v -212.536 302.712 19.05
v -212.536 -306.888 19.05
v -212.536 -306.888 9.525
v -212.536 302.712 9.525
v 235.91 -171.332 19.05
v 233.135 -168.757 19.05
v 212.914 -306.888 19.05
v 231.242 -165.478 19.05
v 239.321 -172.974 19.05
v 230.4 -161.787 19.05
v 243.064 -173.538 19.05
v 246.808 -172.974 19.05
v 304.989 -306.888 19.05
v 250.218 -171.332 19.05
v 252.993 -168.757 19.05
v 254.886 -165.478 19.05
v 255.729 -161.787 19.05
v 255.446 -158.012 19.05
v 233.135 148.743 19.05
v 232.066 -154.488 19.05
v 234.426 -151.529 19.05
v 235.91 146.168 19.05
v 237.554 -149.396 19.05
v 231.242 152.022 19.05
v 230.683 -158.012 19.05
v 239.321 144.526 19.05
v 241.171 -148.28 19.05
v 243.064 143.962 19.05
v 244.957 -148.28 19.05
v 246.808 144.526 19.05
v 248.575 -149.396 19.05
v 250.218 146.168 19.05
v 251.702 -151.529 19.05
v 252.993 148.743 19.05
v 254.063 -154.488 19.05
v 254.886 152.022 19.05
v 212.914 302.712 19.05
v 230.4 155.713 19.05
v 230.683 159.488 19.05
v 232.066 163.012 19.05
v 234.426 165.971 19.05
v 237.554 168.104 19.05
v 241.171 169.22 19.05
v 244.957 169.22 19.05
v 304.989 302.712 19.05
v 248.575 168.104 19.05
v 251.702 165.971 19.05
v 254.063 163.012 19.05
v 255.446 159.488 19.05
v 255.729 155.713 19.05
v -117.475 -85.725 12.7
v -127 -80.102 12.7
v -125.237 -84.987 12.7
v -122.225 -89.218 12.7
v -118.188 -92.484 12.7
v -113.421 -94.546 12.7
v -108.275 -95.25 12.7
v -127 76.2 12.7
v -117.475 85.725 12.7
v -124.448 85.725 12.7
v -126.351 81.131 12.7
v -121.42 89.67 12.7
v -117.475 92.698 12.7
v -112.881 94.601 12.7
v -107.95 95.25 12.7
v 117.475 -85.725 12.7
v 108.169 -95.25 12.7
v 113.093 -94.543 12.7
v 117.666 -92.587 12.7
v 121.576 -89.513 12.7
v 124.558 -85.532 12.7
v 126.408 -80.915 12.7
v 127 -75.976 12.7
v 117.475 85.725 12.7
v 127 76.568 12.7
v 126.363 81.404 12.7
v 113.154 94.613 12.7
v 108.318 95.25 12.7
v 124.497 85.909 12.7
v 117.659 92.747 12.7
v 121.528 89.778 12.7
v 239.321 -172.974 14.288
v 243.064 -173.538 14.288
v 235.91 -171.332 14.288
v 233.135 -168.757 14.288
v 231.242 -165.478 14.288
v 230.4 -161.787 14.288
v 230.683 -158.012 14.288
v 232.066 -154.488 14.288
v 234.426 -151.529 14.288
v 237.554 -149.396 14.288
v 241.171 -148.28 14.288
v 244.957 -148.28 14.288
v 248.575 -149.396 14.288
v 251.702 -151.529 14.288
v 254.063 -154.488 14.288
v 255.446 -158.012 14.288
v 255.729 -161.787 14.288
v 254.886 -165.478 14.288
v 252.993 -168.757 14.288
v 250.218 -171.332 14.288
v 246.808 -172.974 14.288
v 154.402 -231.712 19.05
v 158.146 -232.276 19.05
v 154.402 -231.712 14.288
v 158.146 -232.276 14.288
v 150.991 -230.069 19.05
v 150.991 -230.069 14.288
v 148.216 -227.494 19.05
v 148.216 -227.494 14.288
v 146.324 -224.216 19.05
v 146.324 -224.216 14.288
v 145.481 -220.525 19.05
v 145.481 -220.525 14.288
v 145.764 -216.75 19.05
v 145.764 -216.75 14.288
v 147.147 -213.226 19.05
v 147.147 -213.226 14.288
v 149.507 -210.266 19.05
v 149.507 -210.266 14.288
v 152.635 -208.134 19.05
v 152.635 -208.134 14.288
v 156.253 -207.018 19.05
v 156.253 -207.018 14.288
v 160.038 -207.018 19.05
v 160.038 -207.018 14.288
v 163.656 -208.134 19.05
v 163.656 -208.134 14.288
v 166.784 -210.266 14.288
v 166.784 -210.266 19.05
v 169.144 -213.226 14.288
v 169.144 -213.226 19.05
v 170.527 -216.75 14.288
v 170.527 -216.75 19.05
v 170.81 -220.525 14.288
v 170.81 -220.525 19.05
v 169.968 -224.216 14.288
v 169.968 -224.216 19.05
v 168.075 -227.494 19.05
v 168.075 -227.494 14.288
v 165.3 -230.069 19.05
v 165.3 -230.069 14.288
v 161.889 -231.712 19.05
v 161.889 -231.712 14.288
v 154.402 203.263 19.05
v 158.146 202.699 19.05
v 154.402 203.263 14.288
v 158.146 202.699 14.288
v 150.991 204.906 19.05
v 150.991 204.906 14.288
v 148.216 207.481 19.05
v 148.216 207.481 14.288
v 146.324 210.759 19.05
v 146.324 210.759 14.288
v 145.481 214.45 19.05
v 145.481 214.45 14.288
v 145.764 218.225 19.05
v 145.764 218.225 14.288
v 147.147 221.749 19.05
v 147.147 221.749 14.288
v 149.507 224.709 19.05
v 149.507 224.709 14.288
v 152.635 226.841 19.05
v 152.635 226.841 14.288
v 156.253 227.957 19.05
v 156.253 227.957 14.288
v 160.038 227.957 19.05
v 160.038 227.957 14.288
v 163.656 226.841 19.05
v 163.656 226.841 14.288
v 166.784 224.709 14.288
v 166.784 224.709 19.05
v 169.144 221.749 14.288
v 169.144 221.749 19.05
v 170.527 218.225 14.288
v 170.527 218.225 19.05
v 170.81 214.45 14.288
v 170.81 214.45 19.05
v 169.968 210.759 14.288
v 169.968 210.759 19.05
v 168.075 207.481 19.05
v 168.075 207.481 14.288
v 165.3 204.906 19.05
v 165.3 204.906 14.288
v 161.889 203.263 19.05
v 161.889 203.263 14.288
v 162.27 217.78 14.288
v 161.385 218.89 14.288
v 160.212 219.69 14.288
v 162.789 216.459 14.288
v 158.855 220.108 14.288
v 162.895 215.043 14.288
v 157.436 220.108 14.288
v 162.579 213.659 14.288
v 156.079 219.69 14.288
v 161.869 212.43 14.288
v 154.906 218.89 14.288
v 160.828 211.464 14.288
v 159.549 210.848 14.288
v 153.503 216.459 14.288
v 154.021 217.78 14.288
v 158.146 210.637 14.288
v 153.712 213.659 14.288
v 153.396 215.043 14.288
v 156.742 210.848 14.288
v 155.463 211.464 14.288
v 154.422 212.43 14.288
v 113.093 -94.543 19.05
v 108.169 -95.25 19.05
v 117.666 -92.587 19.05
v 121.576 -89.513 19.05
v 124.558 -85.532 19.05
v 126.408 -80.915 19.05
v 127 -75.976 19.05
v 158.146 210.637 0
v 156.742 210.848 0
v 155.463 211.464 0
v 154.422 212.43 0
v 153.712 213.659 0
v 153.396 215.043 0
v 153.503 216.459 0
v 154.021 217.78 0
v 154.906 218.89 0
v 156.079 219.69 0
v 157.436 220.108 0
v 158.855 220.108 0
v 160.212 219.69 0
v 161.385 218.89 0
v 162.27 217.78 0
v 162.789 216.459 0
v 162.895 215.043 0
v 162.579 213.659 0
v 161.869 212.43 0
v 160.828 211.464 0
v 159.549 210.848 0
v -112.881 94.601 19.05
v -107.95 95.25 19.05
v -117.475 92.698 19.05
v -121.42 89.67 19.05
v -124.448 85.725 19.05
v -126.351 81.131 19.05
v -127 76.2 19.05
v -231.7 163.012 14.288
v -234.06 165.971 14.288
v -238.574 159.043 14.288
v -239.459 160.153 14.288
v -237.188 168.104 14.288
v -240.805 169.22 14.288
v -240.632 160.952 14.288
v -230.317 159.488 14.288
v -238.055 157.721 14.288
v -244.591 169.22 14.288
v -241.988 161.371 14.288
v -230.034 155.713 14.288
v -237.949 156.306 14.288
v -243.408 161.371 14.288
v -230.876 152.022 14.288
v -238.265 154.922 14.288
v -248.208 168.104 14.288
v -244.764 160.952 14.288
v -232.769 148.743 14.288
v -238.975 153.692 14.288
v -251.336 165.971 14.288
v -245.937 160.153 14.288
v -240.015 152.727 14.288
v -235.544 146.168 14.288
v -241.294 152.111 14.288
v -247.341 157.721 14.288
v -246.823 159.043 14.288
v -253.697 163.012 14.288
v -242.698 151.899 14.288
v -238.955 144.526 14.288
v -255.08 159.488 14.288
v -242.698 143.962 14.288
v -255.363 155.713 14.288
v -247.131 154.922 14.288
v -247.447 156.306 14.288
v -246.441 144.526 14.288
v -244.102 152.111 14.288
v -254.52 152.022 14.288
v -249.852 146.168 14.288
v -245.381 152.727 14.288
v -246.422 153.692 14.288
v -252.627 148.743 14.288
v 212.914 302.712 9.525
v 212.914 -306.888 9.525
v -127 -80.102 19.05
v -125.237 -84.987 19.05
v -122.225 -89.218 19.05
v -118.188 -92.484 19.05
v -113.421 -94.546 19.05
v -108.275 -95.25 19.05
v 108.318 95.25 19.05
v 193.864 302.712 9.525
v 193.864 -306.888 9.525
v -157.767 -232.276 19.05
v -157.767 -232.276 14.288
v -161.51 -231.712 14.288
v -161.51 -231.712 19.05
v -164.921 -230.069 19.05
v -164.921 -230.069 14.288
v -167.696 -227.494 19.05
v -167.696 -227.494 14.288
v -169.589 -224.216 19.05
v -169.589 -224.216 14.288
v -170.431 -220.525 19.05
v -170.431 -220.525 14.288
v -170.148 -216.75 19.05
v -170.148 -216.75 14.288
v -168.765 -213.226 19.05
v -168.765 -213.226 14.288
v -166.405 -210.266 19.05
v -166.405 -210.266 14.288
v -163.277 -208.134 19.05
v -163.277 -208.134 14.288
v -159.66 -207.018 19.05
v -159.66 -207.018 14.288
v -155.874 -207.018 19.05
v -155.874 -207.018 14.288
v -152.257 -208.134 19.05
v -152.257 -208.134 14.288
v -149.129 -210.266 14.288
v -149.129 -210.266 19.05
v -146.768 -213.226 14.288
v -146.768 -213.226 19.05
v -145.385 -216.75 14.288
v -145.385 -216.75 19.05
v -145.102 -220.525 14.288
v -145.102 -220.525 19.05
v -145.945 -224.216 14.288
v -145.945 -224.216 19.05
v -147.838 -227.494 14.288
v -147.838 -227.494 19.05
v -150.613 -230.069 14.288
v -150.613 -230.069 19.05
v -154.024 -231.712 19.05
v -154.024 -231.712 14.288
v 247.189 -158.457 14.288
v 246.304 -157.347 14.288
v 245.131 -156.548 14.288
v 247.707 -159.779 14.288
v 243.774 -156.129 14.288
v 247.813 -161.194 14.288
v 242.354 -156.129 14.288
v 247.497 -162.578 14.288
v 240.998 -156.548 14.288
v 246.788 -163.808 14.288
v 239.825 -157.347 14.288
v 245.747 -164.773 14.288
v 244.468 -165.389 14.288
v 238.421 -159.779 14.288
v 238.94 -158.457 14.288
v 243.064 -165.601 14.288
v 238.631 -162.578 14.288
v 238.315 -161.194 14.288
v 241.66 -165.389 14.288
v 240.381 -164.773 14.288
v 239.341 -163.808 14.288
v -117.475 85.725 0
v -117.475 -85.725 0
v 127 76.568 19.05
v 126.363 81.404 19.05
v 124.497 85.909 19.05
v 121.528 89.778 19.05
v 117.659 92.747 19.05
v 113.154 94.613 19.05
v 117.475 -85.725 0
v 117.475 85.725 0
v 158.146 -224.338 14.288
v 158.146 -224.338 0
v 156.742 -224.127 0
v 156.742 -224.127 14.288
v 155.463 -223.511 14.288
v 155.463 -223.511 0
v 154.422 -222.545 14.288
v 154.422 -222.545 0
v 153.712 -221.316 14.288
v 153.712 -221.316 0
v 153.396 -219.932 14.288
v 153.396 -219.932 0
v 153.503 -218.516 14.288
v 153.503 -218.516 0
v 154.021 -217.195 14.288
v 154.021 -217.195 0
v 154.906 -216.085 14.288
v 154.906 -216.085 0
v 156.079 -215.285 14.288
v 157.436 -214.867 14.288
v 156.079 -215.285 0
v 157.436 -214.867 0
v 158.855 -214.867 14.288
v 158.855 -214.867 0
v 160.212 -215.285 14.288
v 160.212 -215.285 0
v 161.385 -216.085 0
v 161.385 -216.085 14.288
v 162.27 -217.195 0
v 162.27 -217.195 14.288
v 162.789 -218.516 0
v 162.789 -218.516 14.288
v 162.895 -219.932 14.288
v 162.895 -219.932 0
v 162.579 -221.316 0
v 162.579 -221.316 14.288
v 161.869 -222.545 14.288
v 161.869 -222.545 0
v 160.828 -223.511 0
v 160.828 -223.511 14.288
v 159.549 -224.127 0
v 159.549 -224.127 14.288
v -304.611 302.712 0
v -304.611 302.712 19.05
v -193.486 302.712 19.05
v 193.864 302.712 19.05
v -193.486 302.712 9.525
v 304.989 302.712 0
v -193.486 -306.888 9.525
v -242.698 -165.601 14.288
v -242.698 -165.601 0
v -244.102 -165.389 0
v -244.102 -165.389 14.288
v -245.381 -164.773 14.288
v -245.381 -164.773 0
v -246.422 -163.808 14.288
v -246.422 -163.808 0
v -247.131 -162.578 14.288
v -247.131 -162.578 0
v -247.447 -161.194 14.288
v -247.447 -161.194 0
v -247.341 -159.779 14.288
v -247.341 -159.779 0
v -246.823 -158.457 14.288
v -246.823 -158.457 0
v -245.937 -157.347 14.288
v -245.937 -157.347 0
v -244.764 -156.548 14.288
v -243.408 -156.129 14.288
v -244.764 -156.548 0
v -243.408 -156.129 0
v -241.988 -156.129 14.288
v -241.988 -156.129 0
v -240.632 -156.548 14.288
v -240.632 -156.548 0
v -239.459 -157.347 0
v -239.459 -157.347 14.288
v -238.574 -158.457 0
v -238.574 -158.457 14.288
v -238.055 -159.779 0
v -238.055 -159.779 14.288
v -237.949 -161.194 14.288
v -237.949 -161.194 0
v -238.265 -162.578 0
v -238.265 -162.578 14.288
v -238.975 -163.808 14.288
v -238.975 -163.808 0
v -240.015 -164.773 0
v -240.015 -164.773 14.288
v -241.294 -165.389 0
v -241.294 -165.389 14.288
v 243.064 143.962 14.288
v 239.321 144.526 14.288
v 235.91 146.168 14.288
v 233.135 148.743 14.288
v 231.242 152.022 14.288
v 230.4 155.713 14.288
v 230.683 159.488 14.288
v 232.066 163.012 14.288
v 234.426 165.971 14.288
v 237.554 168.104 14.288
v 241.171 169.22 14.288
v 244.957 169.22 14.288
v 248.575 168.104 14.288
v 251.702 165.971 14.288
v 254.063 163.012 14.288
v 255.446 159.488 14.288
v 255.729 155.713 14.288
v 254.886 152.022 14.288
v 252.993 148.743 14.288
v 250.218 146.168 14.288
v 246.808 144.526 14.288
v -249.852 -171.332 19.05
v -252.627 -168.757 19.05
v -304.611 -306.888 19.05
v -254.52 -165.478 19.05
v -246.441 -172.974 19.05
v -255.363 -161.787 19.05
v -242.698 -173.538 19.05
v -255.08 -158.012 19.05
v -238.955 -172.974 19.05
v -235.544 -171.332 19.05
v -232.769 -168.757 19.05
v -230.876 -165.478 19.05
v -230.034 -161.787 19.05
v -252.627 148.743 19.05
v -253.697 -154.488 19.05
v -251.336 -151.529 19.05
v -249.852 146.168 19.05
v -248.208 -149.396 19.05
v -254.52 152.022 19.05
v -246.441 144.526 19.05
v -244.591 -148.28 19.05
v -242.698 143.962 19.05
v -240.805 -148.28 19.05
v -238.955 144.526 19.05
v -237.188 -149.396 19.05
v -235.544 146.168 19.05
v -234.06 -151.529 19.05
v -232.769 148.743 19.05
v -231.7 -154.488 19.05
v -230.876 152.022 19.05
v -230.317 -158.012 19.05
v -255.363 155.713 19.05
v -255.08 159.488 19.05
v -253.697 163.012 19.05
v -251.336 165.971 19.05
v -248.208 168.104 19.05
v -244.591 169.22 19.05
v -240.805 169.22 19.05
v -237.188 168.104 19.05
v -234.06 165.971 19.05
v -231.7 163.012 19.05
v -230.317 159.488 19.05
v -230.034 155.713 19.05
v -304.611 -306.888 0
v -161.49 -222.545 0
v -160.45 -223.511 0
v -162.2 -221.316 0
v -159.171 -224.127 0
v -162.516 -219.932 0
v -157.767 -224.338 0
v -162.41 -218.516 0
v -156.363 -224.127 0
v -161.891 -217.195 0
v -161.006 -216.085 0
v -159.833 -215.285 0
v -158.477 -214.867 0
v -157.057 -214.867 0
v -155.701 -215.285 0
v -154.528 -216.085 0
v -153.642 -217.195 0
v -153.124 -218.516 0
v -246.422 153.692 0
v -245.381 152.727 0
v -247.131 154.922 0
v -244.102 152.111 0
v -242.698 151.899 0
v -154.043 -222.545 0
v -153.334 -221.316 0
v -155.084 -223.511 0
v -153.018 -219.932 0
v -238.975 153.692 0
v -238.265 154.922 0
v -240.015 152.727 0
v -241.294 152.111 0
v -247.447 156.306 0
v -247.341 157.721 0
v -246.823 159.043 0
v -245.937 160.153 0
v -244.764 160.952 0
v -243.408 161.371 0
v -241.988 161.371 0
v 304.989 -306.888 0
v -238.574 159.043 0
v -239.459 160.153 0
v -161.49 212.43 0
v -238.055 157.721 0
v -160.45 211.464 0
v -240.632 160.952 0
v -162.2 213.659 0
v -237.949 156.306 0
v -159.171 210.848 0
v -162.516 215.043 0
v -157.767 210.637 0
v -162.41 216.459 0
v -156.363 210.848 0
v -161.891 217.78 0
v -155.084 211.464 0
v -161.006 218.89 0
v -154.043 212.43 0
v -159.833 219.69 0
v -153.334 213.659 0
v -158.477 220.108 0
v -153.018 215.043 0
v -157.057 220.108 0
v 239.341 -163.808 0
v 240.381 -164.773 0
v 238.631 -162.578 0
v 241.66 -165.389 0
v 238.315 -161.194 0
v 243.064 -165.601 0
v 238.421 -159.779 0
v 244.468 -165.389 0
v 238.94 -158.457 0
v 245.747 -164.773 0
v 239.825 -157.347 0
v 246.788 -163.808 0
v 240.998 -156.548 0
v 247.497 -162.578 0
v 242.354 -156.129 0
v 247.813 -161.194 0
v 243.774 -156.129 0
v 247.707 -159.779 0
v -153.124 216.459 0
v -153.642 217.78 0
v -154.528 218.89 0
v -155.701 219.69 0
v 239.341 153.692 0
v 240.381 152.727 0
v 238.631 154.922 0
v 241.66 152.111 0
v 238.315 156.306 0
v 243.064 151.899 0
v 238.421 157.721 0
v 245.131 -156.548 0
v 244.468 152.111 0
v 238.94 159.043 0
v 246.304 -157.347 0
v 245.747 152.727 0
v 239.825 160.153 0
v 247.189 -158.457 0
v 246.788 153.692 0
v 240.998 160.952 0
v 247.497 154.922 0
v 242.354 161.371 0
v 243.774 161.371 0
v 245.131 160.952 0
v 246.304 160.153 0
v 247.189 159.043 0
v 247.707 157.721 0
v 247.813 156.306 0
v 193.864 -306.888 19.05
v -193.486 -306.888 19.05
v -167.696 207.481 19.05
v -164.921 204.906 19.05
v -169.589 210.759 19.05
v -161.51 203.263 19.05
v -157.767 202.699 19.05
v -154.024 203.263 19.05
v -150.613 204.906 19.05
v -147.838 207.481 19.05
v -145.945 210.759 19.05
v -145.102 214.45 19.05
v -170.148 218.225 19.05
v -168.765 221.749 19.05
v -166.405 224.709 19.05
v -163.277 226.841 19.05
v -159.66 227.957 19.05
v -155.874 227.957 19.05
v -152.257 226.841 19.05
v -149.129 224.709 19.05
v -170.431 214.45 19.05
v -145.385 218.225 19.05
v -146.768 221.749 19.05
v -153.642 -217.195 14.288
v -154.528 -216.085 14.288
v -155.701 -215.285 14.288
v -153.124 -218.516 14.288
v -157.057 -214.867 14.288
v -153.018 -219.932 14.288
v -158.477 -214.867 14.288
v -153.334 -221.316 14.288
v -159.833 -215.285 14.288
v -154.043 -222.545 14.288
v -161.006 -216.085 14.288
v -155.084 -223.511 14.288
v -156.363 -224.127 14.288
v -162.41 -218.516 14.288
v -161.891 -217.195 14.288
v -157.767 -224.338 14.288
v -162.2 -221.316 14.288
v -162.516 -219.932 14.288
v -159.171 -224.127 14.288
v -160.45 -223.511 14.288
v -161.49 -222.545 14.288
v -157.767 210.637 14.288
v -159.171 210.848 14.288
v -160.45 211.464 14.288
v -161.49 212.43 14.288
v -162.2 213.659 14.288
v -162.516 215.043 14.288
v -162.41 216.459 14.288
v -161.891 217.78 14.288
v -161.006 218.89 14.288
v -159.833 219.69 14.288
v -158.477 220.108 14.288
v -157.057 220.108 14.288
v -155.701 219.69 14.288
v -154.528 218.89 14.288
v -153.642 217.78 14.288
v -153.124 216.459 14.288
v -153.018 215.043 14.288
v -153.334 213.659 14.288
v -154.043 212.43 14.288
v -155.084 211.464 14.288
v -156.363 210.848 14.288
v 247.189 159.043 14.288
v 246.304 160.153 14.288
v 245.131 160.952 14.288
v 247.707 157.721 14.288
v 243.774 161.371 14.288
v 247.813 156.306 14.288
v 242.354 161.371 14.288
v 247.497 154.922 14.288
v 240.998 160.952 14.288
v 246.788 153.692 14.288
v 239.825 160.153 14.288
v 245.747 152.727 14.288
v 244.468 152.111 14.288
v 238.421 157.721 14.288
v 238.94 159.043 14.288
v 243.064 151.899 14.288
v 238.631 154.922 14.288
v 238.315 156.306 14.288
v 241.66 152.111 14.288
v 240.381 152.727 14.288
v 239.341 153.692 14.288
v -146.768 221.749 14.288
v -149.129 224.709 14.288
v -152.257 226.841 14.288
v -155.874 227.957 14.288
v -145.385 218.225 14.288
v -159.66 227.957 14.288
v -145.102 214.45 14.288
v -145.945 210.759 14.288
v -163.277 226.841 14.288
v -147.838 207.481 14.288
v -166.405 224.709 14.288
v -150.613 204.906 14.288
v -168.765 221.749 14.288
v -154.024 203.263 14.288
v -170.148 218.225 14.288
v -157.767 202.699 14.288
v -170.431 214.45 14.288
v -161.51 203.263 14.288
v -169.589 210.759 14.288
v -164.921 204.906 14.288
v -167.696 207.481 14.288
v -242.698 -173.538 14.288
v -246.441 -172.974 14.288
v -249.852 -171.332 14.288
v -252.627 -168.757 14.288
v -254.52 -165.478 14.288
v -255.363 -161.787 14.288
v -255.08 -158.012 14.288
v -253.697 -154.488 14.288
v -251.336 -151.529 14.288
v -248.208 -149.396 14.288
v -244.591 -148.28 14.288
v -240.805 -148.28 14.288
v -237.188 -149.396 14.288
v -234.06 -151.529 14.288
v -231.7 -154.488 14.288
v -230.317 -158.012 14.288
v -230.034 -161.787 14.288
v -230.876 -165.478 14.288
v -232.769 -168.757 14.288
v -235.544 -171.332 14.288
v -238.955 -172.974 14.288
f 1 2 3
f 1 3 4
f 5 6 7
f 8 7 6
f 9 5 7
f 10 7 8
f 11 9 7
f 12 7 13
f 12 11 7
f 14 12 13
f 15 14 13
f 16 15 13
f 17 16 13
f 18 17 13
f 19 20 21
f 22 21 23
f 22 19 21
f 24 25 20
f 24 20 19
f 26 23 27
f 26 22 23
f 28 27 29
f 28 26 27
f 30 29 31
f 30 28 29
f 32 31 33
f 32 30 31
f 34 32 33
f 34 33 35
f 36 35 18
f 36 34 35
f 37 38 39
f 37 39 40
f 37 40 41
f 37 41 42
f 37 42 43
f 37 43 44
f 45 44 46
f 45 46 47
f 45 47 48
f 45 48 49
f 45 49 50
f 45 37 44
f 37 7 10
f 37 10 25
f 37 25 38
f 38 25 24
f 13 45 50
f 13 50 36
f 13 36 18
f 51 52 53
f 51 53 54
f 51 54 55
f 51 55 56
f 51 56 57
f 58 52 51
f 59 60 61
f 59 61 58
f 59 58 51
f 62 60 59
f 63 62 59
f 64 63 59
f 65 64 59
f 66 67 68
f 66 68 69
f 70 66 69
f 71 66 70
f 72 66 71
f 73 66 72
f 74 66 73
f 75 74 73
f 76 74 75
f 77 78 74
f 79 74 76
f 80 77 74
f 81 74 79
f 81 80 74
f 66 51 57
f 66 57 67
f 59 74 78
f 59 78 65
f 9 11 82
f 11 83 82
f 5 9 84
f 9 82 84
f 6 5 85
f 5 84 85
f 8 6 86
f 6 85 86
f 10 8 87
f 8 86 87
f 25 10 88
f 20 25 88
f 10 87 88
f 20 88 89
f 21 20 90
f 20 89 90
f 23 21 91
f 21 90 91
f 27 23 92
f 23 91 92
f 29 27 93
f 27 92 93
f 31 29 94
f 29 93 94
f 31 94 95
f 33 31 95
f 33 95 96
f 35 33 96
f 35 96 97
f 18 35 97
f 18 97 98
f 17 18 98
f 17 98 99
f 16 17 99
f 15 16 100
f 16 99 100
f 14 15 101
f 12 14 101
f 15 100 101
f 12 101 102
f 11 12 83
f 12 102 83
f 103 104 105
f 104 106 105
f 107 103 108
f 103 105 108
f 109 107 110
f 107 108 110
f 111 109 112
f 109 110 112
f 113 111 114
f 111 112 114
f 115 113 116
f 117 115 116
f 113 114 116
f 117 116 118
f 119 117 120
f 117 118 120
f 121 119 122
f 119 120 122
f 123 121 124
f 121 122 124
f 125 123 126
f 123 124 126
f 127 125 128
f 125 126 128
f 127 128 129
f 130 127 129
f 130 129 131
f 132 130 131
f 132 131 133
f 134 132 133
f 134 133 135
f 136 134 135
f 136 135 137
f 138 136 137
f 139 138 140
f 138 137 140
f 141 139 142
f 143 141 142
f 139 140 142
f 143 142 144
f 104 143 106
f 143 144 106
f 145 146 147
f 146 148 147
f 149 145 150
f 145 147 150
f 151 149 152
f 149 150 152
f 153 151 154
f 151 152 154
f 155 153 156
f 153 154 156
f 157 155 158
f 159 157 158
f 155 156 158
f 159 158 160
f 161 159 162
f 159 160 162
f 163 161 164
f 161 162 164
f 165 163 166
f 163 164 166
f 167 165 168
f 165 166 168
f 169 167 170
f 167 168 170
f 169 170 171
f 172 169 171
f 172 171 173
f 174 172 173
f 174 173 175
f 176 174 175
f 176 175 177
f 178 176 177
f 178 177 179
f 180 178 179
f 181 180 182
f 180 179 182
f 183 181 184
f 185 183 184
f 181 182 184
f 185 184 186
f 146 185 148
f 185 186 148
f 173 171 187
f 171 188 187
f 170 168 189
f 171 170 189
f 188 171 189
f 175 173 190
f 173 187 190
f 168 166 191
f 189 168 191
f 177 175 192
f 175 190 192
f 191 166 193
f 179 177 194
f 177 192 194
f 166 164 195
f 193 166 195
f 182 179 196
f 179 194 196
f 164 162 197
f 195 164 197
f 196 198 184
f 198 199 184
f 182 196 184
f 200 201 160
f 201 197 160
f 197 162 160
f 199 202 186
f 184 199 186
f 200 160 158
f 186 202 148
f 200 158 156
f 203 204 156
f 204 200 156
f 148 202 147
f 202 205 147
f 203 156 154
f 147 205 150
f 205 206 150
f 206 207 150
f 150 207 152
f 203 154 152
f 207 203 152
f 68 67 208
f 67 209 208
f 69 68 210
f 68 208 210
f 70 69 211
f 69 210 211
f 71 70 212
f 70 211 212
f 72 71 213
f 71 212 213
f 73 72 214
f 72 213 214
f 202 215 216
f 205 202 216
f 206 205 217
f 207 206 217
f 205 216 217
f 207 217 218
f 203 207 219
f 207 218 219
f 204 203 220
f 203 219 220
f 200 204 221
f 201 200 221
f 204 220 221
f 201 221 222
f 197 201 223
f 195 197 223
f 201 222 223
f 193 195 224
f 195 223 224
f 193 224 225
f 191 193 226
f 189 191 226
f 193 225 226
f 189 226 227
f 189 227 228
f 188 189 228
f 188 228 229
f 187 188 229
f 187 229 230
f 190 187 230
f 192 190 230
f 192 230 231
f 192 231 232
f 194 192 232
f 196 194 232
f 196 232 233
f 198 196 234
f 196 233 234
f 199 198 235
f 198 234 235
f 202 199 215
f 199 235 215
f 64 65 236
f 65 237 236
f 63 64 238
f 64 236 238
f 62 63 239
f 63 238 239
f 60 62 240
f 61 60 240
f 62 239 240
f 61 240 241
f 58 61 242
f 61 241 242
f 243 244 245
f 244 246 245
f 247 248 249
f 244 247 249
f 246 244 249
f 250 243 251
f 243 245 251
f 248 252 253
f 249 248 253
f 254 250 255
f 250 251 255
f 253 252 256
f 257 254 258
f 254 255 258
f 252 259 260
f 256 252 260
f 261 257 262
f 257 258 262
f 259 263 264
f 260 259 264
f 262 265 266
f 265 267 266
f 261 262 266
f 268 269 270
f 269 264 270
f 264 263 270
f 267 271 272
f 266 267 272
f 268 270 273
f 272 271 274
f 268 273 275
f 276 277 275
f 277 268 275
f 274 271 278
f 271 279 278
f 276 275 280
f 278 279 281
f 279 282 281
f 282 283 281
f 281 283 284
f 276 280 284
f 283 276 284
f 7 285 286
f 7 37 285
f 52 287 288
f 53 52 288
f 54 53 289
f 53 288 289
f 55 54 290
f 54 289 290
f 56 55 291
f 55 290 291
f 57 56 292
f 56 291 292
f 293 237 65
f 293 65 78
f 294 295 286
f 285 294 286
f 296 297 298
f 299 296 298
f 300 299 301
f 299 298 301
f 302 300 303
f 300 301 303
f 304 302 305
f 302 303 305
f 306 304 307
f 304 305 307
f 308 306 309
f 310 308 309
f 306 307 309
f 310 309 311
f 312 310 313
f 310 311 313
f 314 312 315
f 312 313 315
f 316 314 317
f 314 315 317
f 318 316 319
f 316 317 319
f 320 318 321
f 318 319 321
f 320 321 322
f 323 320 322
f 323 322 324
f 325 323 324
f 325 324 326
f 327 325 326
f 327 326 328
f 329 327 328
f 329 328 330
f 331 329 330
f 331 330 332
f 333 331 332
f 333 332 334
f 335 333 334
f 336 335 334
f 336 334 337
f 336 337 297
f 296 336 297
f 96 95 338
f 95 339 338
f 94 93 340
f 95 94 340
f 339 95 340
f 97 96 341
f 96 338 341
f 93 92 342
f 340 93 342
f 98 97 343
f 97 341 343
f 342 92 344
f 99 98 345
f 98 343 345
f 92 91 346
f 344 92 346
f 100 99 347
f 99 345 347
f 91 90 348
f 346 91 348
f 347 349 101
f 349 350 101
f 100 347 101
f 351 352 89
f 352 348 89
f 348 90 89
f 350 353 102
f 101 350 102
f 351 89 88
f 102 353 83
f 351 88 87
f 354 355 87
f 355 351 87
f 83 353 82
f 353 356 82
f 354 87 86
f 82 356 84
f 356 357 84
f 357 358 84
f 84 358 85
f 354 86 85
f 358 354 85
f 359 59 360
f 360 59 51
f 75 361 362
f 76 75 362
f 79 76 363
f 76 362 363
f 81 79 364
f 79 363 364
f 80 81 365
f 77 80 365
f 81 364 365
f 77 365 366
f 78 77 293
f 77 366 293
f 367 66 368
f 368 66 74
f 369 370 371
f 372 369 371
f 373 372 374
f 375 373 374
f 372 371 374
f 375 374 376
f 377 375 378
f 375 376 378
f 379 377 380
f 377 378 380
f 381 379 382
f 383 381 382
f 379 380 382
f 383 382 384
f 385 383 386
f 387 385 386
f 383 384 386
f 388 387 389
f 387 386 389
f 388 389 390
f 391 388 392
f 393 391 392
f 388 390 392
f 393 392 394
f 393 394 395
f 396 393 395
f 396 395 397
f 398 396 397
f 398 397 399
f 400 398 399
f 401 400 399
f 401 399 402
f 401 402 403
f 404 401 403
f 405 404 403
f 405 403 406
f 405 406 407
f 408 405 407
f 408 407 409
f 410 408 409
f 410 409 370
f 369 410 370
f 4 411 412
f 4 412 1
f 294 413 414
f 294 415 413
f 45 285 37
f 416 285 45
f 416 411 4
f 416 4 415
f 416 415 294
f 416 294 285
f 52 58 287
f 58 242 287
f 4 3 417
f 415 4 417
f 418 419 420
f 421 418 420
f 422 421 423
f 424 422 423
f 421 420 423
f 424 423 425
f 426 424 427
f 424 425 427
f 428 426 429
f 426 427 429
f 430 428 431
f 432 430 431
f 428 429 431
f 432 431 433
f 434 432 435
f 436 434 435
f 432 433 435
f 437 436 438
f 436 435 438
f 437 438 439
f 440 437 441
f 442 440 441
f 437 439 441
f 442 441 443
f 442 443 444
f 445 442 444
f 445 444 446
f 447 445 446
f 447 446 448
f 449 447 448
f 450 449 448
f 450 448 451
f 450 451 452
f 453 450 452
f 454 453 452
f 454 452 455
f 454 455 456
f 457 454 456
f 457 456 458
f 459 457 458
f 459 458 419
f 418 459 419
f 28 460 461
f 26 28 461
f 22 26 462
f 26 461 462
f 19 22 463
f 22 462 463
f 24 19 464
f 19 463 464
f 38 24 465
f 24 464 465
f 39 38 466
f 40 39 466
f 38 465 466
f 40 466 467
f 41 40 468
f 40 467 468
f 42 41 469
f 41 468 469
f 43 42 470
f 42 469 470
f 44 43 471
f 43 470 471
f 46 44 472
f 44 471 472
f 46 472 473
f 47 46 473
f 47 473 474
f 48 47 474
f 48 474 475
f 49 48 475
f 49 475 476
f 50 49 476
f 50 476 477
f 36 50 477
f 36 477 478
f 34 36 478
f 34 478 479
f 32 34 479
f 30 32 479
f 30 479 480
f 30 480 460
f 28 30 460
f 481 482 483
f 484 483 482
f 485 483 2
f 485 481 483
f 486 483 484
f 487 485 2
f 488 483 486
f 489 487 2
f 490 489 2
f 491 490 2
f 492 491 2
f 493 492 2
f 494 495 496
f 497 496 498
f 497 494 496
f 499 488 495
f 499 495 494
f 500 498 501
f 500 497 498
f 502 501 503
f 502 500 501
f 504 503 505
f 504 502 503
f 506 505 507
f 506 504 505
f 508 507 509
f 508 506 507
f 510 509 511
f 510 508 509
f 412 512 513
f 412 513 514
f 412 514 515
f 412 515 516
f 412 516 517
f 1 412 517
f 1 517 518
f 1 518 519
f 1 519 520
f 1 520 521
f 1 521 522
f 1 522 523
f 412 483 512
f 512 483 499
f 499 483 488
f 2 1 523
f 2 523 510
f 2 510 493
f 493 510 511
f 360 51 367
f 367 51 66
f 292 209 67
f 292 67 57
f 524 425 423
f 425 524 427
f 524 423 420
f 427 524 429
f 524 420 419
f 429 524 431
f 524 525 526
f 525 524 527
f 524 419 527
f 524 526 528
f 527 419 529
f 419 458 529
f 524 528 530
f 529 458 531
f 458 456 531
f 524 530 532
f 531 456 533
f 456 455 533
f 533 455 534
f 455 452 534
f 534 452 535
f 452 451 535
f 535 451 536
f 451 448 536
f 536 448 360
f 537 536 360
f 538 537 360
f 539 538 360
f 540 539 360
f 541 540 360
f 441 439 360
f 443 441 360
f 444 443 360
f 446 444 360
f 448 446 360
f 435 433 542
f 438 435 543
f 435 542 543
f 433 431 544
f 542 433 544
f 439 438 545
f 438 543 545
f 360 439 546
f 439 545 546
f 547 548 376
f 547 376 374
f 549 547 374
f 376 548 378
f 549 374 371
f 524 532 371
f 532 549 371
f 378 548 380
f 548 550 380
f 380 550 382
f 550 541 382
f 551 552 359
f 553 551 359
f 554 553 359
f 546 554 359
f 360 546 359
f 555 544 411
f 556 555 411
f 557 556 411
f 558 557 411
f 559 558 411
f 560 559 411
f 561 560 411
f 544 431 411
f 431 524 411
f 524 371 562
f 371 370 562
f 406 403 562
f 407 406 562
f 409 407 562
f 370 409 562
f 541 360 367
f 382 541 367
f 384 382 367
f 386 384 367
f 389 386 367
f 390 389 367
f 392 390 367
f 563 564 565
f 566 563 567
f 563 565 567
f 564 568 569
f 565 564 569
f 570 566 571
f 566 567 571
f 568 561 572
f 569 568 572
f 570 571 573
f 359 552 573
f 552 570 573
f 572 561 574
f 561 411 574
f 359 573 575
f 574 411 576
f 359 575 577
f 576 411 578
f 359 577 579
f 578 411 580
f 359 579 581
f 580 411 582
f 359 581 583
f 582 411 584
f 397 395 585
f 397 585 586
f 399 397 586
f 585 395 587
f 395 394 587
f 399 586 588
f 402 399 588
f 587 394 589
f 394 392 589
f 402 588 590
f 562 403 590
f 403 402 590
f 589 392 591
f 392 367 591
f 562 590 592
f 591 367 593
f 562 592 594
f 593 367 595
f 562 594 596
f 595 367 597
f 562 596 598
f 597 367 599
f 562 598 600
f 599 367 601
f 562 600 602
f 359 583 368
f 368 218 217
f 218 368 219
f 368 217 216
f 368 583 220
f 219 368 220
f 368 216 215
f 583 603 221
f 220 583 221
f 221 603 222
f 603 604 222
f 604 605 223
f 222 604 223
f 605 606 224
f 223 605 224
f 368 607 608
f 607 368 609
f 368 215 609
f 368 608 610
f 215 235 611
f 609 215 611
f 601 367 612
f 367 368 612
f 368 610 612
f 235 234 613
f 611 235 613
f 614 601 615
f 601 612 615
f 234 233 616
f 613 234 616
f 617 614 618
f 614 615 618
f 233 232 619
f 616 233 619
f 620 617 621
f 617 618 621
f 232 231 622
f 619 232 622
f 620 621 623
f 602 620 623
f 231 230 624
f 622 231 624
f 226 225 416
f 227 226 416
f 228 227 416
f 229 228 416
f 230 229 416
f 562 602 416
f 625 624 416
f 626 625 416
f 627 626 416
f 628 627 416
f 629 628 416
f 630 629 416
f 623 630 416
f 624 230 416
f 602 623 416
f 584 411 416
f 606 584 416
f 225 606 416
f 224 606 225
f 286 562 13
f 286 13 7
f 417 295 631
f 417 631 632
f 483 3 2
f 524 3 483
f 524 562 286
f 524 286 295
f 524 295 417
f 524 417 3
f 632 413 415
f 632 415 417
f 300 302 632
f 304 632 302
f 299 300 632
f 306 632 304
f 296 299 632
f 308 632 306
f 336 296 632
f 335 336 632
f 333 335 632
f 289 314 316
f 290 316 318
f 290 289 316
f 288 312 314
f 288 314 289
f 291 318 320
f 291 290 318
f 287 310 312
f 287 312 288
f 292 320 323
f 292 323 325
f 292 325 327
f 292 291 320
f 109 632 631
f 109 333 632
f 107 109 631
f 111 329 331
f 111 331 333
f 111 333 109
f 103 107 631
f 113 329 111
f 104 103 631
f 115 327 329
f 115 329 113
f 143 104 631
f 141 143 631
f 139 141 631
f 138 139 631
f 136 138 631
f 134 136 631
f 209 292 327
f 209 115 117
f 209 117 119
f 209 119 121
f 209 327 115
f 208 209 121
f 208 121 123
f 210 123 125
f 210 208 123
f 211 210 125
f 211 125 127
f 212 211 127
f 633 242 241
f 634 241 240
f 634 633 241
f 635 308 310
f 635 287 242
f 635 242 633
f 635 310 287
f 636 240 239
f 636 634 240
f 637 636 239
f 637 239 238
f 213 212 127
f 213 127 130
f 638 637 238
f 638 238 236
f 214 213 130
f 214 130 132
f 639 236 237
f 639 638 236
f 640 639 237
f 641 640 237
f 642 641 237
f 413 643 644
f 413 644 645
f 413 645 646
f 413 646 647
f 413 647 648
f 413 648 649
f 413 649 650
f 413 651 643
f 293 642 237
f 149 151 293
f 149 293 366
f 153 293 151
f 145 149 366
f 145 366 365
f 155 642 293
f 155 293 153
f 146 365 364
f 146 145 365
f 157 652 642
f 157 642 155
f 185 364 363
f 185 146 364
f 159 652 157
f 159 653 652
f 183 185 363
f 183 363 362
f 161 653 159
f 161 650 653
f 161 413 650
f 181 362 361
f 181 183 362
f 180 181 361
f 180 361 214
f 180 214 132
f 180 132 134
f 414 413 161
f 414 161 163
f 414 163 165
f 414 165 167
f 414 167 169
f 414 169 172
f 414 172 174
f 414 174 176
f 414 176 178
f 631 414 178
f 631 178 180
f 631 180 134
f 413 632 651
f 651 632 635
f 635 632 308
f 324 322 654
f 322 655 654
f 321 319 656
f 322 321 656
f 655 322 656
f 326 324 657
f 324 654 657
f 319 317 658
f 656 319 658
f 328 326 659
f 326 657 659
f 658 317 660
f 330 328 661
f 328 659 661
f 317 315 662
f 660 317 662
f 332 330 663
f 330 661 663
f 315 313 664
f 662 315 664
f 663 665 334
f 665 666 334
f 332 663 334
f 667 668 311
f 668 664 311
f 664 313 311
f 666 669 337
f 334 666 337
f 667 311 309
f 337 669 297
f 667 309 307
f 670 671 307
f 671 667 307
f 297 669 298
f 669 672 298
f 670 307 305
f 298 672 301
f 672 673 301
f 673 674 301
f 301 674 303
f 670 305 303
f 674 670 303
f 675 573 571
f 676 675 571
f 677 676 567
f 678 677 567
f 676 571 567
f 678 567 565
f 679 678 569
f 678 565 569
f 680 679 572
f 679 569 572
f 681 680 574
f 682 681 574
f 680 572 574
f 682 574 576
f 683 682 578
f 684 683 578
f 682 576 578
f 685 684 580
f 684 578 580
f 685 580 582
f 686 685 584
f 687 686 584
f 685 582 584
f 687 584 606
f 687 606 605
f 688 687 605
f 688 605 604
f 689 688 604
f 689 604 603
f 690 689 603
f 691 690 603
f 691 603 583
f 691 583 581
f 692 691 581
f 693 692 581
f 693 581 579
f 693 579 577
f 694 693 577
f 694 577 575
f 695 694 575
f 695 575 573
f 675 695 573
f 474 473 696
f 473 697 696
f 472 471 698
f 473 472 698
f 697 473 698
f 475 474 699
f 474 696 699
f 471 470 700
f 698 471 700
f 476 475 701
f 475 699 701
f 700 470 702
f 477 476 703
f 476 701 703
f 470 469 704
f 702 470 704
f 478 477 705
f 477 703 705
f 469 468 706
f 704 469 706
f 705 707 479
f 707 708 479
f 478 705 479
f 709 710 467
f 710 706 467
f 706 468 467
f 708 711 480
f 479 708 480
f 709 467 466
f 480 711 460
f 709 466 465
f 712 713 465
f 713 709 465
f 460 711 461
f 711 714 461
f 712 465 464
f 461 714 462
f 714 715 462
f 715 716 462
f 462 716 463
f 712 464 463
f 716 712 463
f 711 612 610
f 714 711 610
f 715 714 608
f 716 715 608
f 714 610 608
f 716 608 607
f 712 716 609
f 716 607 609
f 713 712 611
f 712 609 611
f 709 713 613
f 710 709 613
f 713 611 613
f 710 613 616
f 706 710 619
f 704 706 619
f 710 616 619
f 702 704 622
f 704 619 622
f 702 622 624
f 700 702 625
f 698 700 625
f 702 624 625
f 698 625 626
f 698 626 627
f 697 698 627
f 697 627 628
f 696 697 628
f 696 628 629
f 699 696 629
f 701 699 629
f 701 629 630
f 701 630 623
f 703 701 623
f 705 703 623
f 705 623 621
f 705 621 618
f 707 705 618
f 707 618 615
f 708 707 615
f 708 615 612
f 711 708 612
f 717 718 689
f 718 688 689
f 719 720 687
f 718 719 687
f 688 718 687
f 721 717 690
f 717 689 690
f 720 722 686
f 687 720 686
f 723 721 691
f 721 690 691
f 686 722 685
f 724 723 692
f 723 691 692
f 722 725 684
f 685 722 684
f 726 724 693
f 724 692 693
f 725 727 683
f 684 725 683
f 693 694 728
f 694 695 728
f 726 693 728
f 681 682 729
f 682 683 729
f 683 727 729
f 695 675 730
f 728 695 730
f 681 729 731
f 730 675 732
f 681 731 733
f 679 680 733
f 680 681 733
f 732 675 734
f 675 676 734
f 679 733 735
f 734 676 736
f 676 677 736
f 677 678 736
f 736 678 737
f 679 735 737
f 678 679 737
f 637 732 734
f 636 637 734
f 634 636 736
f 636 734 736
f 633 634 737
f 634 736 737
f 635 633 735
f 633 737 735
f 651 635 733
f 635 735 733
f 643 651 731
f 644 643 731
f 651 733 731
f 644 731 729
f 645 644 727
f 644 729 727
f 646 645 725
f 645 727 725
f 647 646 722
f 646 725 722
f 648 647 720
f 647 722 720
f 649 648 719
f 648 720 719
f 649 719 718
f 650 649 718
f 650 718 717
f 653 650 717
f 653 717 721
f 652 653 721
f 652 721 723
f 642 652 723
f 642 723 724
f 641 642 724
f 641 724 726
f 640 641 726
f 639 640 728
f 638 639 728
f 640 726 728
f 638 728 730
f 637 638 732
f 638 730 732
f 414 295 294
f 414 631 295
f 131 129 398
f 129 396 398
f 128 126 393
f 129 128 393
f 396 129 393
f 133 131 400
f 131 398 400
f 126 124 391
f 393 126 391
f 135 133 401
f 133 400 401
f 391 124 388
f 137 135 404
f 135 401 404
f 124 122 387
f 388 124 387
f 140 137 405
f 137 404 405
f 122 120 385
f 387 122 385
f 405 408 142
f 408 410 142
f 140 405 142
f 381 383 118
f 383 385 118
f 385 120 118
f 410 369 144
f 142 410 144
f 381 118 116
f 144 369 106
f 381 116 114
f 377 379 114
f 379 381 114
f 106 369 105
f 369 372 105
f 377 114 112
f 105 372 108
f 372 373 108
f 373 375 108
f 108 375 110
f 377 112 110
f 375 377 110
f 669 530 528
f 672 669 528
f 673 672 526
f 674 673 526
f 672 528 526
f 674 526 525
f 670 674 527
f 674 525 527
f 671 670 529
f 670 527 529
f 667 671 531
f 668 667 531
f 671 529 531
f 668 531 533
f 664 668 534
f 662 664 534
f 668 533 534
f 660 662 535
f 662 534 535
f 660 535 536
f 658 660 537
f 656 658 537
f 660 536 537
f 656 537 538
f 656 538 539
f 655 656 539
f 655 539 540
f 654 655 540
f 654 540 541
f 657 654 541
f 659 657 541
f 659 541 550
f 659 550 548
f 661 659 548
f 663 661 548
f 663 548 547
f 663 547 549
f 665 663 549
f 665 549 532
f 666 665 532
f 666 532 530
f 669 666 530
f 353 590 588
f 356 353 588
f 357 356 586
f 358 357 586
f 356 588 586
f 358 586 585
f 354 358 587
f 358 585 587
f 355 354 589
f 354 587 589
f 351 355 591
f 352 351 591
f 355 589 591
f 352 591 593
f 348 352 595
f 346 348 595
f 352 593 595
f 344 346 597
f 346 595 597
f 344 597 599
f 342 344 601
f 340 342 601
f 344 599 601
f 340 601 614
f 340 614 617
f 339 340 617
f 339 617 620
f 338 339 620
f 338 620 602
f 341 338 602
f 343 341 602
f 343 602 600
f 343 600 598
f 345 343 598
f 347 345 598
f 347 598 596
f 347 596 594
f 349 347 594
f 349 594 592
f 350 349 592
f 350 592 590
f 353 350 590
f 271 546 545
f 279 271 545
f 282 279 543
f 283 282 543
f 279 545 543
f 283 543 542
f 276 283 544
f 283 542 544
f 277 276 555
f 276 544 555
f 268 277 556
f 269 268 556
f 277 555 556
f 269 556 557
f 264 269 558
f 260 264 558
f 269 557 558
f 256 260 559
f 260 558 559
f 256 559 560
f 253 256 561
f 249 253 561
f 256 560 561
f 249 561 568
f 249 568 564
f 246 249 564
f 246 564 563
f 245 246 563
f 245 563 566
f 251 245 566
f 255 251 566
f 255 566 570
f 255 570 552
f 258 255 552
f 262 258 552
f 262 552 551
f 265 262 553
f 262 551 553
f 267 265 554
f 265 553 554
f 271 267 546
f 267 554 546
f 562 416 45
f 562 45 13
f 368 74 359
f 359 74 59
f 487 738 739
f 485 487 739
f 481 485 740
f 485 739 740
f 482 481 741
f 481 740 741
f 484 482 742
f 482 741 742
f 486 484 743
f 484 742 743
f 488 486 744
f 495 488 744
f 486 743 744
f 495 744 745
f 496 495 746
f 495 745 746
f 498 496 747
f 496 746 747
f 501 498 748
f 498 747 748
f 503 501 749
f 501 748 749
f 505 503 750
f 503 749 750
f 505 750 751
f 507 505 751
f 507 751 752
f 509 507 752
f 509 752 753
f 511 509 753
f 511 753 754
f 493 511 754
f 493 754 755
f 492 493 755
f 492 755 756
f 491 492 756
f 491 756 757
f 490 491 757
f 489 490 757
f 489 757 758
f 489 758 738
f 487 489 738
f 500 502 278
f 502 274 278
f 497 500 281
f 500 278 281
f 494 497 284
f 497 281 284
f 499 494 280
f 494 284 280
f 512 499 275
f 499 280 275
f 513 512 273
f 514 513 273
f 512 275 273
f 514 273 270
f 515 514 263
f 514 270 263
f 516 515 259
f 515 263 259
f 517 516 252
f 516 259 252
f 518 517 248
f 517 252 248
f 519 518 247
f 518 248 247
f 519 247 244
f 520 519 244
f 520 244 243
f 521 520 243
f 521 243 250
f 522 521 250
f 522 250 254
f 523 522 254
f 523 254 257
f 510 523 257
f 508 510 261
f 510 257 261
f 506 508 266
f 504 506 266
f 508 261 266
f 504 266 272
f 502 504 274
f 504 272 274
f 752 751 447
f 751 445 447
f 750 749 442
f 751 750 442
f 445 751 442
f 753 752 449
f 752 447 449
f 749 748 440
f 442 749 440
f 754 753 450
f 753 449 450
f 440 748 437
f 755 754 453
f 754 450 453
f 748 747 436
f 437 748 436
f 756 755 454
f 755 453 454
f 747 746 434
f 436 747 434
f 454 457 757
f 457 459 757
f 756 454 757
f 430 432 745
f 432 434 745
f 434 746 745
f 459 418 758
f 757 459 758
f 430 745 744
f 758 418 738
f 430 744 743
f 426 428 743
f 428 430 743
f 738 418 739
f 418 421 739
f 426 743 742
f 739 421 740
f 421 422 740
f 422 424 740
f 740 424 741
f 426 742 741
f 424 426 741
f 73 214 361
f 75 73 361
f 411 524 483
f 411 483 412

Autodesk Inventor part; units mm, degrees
ref_plane "YZ Plane" through (0, 0, 0) normal (1, 0, 0) x (0, 1, 0)
ref_plane "XZ Plane" through (0, 0, 0) normal (0, 1, 0) x (-1, 0, 0)
ref_plane "XY Plane" through (0, 0, 0) normal (0, 0, 1) x (1, 0, 0)
sketch "Sketch1" plane through (0, 0, 0) normal (0, 0, 1) x (1, 0, 0)
  line L0 (-304.6106, 302.7116) -> (304.9894, 302.7116)
  line L1 (304.9894, 302.7116) -> (304.9894, -306.8884)
  line L2 (304.9894, -306.8884) -> (-304.6106, -306.8884)
  line L3 (-304.6106, -306.8884) -> (-304.6106, 302.7116)
  point P0 (0, 0)
  dimension "d0" = 609.6
  dimension "d2" = 609.6
extrude "Extrusion1" add sketch "Sketch1" along normal blind 19.05
sketch "Sketch2" plane through (0, 0, 19.05) normal (0, 0, 1) x (1, 0, 0)
  circle A0 centre (-242.6981, -160.8384) radius 4.7625
  circle A1 centre (243.0642, -160.8384) radius 4.7625
  circle A2 centre (243.0642, 156.6616) radius 4.7625
  circle A3 centre (-242.6981, 156.6616) radius 4.7625
  circle A4 centre (-157.7669, -219.5759) radius 4.7625
  circle A5 centre (158.1456, -219.5759) radius 4.7625
  circle A6 centre (158.1456, 215.3991) radius 4.7625
  circle A7 centre (-157.7669, 215.3991) radius 4.7625
  point P0 (-304.6106, -306.8884)
  point P1 (0, 0)
  point P2 (304.9894, 302.7116)
  point P3 (-304.6106, 302.7116)
  point P4 (304.9894, -306.8884)
  dimension "d5" = 9.525
  dimension "d6" = 146.05
  dimension "d7" = 61.9125
  dimension "d15" = 9.525
  dimension "d16" = 146.05
  dimension "d17" = 61.9252
  dimension "d18" = 9.525
  dimension "d19" = 61.9252
  dimension "d20" = 146.05
  dimension "d21" = 9.525
  dimension "d22" = 61.9125
  dimension "d23" = 146.05
  dimension "d24" = 9.525
  dimension "d25" = 146.8438
  dimension "d26" = 87.3125
  dimension "d27" = 9.525
  dimension "d28" = 146.8438
  dimension "d29" = 87.3125
  dimension "d30" = 9.525
  dimension "d31" = 87.3125
  dimension "d32" = 146.8438
  dimension "d33" = 9.525
  dimension "d34" = 146.8438
  dimension "d35" = 87.3125
hole "Hole2" at (-242.6981, -160.8384, 19.05) at (-242.6981, 156.6616, 19.05) at (-157.7669, 215.3991, 19.05) at (158.1456, 215.3991, 19.05) at (243.0642, 156.6616, 19.05) at (243.0642, -160.8384, 19.05) at (158.1456, -219.5759, 19.05) at (-157.7669, -219.5759, 19.05) direction (0, 0, -1) diameter 9.525 end through all counterbore diameter 25.4 counterbore depth 4.7625
sketch "Sketch3" plane through (0, 0, 19.05) normal (0, 0, 1) x (1, 0, 0)
  line L0 (-117.475, -85.725) -> (117.475, -85.725)
  line L1 (117.475, -85.725) -> (117.475, 85.725)
  line L2 (117.475, 85.725) -> (-117.475, 85.725)
  line L3 (-117.475, 85.725) -> (-117.475, -85.725)
  line L4 (-117.475, -85.725) -> (117.475, 85.725) construction
  line L5 (117.475, -85.725) -> (-117.475, 85.725) construction
  point P0 (0, 0)
  dimension "d43" = 234.95
  dimension "d44" = 171.45
extrude "Extrusion2" cut sketch "Sketch3" against normal blind 19.05
sketch "Sketch4" plane through (0, 0, 19.05) normal (0, 0, 1) x (1, 0, 0)
  line L0 (117.475, 85.725) -> (117.475, -85.725) projected
  line L1 (117.475, -85.725) -> (-117.475, -85.725) projected
  line L2 (-117.475, -85.725) -> (-117.475, 85.725) projected
  line L3 (-117.475, 85.725) -> (117.475, 85.725) projected
  arc A0 (-107.95, 95.25) -> (-127, 76.2) centre (-107.95, 76.2) ccw
  line L4 (-107.95, 76.2) -> (-107.95, 95.25) construction
  line L5 (-107.95, 76.2) -> (-88.9, 76.2) construction
  line L6 (-107.95, 76.2) -> (-127, 76.2) construction
  arc A1 (-127, -80.1017) -> (-108.2751, -95.25) centre (-108.2751, -76.1028) ccw
  arc A2 (108.1693, -95.25) -> (127, -75.9762) centre (107.9478, -76.1978) ccw
  line L7 (107.9478, -76.1978) -> (127, -75.9762) construction
  line L8 (107.9478, -76.1978) -> (108.1693, -95.25) construction
  arc A3 (127, 76.5685) -> (108.3185, 95.25) centre (108.3185, 76.5685) ccw
  line L9 (127, -75.9762) -> (127, 76.5685)
  line L10 (-107.95, 95.25) -> (108.3185, 95.25)
  line L11 (108.1693, -95.25) -> (-108.2751, -95.25)
  line L12 (-127, 76.2) -> (-127, -80.1017)
  point P0 (0, 0)
  dimension "d47" = 19.05
  dimension "d48" = 90
  dimension "d49" = 90
  dimension "d50" = 9.525
  dimension "d51" = 9.525
  dimension "d52" = 9.525
  dimension "d53" = 9.525
  dimension "d54" = 90
  dimension "d55" = 9.525
  dimension "d56" = 9.525
  dimension "d57" = 9.525
  dimension "d58" = 9.525
extrude "Extrusion3" cut sketch "Sketch4" against normal blind 6.35
sketch "Sketch5" plane through (0, 0, 19.05) normal (0, 0, 1) x (1, 0, 0)
  line L0 (-304.6106, 302.7116) -> (-304.6106, -306.8884) projected
  line L1 (-304.6106, -306.8884) -> (304.9894, -306.8884) projected
  line L2 (304.9894, -306.8884) -> (304.9894, 302.7116) projected
  line L3 (-212.5356, 306.8884) -> (-193.4856, 306.8884)
  line L4 (-193.4856, 306.8884) -> (-193.4856, -306.8884)
  line L5 (-193.4856, -306.8884) -> (-212.5356, -306.8884)
  line L6 (-212.5356, -306.8884) -> (-212.5356, 306.8884)
  line L7 (-212.5356, 306.8884) -> (-193.4856, -306.8884) construction
  line L8 (-193.4856, 306.8884) -> (-212.5356, -306.8884) construction
  line L9 (193.8644, 306.8884) -> (212.9144, 306.8884)
  line L10 (212.9144, 306.8884) -> (212.9144, -306.8884)
  line L11 (212.9144, -306.8884) -> (193.8644, -306.8884)
  line L12 (193.8644, -306.8884) -> (193.8644, 306.8884)
  line L13 (193.8644, 306.8884) -> (212.9144, -306.8884) construction
  line L14 (212.9144, 306.8884) -> (193.8644, -306.8884) construction
  point P0 (0, 0)
  point P1 (-203.0106, 0)
  point P2 (203.3894, 0)
  dimension "d61" = 19.05
  dimension "d62" = 101.6
  dimension "d63" = 19.05
  dimension "d64" = 101.6
extrude "Extrusion4" cut sketch "Sketch5" against normal blind 9.525
properties part number "router_table_1"
